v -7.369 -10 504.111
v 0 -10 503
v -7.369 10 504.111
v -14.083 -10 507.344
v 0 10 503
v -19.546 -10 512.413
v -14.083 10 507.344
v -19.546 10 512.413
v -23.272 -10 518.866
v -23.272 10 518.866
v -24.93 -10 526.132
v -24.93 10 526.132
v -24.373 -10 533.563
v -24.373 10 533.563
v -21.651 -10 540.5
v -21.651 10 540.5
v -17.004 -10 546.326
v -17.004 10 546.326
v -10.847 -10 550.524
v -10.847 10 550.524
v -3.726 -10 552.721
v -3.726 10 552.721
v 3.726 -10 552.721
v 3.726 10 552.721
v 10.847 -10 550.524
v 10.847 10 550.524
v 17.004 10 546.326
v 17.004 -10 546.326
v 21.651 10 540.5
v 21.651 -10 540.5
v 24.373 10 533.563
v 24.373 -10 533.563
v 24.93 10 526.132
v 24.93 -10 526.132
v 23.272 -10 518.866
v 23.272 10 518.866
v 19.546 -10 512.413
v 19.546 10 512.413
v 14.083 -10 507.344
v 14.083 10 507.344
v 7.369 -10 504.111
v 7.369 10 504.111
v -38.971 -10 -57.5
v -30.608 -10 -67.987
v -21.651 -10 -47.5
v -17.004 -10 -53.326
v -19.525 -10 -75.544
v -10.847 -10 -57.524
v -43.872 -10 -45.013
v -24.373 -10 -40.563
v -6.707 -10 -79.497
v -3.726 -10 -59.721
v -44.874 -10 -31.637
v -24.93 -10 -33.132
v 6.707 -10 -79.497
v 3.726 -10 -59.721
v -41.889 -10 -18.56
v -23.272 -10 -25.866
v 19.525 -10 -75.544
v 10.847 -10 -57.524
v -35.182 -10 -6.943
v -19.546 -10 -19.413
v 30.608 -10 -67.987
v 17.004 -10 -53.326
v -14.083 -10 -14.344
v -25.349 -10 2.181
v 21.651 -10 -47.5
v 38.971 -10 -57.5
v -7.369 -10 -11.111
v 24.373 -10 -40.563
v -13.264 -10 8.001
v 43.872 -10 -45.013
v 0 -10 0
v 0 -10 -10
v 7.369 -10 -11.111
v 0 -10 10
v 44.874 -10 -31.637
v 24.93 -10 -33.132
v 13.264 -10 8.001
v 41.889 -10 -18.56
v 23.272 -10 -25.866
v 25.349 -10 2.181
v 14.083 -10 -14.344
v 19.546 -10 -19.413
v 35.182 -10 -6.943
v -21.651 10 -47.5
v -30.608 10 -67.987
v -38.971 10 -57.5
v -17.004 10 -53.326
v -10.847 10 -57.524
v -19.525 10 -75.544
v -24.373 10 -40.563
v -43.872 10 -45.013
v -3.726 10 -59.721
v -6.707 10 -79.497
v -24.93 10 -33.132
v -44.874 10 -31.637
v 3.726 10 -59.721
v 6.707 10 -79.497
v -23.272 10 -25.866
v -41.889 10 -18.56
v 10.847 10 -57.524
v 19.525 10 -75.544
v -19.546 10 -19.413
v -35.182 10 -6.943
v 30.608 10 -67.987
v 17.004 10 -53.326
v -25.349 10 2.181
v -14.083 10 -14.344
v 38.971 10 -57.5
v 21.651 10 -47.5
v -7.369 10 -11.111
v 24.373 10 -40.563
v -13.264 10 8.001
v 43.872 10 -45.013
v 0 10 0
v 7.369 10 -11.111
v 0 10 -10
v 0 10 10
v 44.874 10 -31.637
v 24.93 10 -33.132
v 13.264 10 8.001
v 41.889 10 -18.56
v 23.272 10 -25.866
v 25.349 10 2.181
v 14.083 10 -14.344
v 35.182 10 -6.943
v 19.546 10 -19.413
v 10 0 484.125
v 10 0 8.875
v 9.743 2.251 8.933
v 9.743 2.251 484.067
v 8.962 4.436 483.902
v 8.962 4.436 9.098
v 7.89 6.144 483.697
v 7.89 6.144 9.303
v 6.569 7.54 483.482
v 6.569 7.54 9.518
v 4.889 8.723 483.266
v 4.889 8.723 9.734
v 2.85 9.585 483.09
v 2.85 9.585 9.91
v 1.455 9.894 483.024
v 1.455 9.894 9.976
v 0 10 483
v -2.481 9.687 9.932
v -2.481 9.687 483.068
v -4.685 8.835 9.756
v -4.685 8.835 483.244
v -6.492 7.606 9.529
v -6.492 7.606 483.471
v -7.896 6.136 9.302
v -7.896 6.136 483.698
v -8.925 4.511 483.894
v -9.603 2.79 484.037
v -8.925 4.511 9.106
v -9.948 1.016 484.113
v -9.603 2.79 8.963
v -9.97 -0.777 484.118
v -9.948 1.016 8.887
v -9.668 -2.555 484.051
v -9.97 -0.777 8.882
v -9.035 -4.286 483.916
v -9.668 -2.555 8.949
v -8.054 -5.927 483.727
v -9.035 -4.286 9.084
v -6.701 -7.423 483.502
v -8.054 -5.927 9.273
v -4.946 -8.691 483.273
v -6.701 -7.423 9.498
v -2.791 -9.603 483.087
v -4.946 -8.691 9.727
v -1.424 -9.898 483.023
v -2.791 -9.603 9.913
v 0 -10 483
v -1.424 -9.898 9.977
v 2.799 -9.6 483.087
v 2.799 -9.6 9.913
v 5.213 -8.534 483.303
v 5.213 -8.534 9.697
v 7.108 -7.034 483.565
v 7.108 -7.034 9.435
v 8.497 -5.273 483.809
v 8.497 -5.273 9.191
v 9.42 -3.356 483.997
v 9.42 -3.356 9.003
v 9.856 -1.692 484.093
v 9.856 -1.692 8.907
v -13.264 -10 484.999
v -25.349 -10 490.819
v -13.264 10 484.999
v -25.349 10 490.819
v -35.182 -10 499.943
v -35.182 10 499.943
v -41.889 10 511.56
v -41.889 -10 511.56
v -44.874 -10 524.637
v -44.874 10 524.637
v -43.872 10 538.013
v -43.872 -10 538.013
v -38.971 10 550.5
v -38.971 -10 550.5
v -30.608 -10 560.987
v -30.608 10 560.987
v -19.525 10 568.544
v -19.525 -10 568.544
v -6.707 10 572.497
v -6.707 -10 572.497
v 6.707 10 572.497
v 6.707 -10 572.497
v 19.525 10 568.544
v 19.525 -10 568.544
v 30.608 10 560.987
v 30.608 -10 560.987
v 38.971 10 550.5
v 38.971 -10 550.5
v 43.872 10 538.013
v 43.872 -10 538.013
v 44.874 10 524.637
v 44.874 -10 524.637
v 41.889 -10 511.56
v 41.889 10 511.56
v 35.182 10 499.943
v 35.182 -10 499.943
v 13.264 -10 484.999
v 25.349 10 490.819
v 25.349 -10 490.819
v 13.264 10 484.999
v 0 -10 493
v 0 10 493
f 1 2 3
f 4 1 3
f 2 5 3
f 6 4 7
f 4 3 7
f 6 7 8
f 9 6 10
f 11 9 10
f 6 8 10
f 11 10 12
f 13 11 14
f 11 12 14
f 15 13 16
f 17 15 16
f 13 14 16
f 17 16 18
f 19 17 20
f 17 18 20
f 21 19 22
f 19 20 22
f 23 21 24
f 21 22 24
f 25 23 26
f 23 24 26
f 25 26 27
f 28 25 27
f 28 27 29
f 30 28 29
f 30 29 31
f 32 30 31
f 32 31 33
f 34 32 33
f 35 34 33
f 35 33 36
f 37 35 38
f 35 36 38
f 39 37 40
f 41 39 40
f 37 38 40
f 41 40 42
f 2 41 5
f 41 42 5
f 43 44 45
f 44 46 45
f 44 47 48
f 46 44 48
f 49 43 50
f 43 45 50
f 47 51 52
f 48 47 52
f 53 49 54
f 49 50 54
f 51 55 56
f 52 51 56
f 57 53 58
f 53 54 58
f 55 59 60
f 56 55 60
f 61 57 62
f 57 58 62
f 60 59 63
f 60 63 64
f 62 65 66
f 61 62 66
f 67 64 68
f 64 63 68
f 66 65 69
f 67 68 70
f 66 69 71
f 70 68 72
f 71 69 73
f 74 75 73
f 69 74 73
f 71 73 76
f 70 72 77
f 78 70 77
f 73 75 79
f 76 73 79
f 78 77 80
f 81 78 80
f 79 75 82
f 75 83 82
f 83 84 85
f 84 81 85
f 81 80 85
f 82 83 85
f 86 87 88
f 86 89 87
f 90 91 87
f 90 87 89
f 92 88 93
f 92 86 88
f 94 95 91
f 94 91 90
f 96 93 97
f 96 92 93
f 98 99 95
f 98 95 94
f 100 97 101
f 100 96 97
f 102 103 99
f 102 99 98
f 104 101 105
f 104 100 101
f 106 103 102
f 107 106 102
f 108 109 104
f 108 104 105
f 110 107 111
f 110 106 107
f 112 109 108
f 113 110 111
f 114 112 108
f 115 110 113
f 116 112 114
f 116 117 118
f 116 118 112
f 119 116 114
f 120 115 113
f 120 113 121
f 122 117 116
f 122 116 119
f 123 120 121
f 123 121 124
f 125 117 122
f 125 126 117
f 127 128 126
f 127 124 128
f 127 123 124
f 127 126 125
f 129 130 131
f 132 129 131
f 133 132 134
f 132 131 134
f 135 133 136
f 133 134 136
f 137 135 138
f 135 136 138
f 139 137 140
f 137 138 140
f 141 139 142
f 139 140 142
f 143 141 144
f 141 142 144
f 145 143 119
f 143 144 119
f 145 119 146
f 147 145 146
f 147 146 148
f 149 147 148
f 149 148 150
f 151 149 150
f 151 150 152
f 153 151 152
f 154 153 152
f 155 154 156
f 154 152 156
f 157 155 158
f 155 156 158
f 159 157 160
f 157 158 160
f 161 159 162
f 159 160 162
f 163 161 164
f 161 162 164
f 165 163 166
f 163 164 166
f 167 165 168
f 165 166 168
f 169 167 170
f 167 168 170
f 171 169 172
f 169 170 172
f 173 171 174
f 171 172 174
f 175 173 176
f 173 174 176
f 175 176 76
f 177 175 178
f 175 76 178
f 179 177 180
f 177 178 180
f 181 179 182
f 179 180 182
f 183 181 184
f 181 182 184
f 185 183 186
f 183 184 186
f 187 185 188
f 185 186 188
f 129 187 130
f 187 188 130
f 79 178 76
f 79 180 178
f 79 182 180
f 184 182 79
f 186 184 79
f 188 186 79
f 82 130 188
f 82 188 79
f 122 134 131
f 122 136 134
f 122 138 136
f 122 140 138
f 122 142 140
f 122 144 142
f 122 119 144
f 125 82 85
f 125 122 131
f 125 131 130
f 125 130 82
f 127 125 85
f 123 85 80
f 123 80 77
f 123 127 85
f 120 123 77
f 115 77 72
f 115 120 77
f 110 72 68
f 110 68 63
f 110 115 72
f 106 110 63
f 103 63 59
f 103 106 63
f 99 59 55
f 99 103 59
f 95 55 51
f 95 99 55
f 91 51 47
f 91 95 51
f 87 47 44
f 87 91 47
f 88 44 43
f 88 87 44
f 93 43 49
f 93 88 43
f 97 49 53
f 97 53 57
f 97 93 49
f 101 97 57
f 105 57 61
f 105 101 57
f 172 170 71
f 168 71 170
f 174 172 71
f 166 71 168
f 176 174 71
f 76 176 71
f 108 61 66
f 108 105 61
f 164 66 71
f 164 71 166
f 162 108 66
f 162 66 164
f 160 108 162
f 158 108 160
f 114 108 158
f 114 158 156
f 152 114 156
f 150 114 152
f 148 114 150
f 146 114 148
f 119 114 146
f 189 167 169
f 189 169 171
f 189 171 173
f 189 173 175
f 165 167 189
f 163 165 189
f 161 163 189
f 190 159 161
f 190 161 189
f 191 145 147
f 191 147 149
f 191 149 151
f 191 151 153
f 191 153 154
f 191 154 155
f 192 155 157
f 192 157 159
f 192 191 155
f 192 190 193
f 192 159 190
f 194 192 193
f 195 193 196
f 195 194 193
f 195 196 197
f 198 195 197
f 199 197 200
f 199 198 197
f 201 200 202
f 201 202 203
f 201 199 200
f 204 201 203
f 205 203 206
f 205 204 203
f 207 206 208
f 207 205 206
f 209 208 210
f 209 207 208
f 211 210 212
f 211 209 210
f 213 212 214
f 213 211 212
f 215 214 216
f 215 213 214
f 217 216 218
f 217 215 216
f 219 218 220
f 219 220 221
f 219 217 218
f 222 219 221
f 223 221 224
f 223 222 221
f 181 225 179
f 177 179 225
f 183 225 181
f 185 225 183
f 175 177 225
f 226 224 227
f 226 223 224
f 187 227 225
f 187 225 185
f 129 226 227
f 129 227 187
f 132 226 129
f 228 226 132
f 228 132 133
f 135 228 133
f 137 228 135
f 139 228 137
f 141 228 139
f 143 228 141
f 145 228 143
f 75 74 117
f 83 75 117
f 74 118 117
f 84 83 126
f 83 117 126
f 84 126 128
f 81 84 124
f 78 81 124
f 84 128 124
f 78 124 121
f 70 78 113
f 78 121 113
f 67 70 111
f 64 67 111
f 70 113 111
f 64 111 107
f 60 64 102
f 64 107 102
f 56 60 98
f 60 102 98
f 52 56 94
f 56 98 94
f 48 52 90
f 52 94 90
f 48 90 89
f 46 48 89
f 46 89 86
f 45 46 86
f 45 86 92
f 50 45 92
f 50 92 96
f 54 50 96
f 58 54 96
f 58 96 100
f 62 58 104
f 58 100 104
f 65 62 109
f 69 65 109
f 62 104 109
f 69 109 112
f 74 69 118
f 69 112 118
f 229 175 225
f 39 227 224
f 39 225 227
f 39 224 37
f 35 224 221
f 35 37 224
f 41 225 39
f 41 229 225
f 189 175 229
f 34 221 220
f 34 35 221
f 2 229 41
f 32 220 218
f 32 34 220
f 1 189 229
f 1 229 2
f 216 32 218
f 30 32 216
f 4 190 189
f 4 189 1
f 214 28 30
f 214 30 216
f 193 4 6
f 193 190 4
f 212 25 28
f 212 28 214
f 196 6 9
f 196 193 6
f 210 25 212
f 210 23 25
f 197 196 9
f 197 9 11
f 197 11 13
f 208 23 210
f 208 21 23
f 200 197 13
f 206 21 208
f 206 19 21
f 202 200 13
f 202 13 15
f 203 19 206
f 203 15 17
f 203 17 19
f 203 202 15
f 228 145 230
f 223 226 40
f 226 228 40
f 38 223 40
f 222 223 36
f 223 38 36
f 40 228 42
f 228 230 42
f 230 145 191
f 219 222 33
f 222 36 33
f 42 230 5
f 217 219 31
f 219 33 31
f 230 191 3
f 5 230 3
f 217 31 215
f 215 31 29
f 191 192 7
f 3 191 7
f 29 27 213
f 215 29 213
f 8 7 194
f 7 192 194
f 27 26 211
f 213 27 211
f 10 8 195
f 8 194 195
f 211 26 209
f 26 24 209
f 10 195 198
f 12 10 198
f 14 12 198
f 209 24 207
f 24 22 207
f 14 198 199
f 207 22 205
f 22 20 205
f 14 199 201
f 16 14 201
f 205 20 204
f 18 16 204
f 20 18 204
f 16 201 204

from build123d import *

# Parameters (mm, degrees)
SKETCH1_R           = 10
BOSS_EXTRUDE1_DEPTH = 493
SKETCH2_W           = 20
SKETCH2_H           = 20
SKETCH3_W           = 20
SKETCH3_H           = 20


with BuildPart() as part:
    # Sketch1 → Boss-Extrude1 (new body)
    with BuildSketch(Plane.XY):
        Circle(SKETCH1_R)
    extrude(amount=BOSS_EXTRUDE1_DEPTH)

    # Sketch2 → Revolve1 (revolve)
    with BuildSketch(Plane(origin=(0, 0, 0), x_dir=(0, 0, -1), z_dir=(1, 0, 0))):
        with Locations((-493, 0)):
            Rectangle(SKETCH2_W, SKETCH2_H)
    revolve(axis=Axis((0, 0, 528), (0, 1, 0)))

    # Sketch3 → Revolve2 (revolve)
    with BuildSketch(Plane(origin=(0, 0, 0), x_dir=(0, 0, -1), z_dir=(1, 0, 0))):
        Rectangle(SKETCH3_W, SKETCH3_H)
    revolve(axis=Axis((0, 0, -35), (0, 1, 0)))


solid = part.part
